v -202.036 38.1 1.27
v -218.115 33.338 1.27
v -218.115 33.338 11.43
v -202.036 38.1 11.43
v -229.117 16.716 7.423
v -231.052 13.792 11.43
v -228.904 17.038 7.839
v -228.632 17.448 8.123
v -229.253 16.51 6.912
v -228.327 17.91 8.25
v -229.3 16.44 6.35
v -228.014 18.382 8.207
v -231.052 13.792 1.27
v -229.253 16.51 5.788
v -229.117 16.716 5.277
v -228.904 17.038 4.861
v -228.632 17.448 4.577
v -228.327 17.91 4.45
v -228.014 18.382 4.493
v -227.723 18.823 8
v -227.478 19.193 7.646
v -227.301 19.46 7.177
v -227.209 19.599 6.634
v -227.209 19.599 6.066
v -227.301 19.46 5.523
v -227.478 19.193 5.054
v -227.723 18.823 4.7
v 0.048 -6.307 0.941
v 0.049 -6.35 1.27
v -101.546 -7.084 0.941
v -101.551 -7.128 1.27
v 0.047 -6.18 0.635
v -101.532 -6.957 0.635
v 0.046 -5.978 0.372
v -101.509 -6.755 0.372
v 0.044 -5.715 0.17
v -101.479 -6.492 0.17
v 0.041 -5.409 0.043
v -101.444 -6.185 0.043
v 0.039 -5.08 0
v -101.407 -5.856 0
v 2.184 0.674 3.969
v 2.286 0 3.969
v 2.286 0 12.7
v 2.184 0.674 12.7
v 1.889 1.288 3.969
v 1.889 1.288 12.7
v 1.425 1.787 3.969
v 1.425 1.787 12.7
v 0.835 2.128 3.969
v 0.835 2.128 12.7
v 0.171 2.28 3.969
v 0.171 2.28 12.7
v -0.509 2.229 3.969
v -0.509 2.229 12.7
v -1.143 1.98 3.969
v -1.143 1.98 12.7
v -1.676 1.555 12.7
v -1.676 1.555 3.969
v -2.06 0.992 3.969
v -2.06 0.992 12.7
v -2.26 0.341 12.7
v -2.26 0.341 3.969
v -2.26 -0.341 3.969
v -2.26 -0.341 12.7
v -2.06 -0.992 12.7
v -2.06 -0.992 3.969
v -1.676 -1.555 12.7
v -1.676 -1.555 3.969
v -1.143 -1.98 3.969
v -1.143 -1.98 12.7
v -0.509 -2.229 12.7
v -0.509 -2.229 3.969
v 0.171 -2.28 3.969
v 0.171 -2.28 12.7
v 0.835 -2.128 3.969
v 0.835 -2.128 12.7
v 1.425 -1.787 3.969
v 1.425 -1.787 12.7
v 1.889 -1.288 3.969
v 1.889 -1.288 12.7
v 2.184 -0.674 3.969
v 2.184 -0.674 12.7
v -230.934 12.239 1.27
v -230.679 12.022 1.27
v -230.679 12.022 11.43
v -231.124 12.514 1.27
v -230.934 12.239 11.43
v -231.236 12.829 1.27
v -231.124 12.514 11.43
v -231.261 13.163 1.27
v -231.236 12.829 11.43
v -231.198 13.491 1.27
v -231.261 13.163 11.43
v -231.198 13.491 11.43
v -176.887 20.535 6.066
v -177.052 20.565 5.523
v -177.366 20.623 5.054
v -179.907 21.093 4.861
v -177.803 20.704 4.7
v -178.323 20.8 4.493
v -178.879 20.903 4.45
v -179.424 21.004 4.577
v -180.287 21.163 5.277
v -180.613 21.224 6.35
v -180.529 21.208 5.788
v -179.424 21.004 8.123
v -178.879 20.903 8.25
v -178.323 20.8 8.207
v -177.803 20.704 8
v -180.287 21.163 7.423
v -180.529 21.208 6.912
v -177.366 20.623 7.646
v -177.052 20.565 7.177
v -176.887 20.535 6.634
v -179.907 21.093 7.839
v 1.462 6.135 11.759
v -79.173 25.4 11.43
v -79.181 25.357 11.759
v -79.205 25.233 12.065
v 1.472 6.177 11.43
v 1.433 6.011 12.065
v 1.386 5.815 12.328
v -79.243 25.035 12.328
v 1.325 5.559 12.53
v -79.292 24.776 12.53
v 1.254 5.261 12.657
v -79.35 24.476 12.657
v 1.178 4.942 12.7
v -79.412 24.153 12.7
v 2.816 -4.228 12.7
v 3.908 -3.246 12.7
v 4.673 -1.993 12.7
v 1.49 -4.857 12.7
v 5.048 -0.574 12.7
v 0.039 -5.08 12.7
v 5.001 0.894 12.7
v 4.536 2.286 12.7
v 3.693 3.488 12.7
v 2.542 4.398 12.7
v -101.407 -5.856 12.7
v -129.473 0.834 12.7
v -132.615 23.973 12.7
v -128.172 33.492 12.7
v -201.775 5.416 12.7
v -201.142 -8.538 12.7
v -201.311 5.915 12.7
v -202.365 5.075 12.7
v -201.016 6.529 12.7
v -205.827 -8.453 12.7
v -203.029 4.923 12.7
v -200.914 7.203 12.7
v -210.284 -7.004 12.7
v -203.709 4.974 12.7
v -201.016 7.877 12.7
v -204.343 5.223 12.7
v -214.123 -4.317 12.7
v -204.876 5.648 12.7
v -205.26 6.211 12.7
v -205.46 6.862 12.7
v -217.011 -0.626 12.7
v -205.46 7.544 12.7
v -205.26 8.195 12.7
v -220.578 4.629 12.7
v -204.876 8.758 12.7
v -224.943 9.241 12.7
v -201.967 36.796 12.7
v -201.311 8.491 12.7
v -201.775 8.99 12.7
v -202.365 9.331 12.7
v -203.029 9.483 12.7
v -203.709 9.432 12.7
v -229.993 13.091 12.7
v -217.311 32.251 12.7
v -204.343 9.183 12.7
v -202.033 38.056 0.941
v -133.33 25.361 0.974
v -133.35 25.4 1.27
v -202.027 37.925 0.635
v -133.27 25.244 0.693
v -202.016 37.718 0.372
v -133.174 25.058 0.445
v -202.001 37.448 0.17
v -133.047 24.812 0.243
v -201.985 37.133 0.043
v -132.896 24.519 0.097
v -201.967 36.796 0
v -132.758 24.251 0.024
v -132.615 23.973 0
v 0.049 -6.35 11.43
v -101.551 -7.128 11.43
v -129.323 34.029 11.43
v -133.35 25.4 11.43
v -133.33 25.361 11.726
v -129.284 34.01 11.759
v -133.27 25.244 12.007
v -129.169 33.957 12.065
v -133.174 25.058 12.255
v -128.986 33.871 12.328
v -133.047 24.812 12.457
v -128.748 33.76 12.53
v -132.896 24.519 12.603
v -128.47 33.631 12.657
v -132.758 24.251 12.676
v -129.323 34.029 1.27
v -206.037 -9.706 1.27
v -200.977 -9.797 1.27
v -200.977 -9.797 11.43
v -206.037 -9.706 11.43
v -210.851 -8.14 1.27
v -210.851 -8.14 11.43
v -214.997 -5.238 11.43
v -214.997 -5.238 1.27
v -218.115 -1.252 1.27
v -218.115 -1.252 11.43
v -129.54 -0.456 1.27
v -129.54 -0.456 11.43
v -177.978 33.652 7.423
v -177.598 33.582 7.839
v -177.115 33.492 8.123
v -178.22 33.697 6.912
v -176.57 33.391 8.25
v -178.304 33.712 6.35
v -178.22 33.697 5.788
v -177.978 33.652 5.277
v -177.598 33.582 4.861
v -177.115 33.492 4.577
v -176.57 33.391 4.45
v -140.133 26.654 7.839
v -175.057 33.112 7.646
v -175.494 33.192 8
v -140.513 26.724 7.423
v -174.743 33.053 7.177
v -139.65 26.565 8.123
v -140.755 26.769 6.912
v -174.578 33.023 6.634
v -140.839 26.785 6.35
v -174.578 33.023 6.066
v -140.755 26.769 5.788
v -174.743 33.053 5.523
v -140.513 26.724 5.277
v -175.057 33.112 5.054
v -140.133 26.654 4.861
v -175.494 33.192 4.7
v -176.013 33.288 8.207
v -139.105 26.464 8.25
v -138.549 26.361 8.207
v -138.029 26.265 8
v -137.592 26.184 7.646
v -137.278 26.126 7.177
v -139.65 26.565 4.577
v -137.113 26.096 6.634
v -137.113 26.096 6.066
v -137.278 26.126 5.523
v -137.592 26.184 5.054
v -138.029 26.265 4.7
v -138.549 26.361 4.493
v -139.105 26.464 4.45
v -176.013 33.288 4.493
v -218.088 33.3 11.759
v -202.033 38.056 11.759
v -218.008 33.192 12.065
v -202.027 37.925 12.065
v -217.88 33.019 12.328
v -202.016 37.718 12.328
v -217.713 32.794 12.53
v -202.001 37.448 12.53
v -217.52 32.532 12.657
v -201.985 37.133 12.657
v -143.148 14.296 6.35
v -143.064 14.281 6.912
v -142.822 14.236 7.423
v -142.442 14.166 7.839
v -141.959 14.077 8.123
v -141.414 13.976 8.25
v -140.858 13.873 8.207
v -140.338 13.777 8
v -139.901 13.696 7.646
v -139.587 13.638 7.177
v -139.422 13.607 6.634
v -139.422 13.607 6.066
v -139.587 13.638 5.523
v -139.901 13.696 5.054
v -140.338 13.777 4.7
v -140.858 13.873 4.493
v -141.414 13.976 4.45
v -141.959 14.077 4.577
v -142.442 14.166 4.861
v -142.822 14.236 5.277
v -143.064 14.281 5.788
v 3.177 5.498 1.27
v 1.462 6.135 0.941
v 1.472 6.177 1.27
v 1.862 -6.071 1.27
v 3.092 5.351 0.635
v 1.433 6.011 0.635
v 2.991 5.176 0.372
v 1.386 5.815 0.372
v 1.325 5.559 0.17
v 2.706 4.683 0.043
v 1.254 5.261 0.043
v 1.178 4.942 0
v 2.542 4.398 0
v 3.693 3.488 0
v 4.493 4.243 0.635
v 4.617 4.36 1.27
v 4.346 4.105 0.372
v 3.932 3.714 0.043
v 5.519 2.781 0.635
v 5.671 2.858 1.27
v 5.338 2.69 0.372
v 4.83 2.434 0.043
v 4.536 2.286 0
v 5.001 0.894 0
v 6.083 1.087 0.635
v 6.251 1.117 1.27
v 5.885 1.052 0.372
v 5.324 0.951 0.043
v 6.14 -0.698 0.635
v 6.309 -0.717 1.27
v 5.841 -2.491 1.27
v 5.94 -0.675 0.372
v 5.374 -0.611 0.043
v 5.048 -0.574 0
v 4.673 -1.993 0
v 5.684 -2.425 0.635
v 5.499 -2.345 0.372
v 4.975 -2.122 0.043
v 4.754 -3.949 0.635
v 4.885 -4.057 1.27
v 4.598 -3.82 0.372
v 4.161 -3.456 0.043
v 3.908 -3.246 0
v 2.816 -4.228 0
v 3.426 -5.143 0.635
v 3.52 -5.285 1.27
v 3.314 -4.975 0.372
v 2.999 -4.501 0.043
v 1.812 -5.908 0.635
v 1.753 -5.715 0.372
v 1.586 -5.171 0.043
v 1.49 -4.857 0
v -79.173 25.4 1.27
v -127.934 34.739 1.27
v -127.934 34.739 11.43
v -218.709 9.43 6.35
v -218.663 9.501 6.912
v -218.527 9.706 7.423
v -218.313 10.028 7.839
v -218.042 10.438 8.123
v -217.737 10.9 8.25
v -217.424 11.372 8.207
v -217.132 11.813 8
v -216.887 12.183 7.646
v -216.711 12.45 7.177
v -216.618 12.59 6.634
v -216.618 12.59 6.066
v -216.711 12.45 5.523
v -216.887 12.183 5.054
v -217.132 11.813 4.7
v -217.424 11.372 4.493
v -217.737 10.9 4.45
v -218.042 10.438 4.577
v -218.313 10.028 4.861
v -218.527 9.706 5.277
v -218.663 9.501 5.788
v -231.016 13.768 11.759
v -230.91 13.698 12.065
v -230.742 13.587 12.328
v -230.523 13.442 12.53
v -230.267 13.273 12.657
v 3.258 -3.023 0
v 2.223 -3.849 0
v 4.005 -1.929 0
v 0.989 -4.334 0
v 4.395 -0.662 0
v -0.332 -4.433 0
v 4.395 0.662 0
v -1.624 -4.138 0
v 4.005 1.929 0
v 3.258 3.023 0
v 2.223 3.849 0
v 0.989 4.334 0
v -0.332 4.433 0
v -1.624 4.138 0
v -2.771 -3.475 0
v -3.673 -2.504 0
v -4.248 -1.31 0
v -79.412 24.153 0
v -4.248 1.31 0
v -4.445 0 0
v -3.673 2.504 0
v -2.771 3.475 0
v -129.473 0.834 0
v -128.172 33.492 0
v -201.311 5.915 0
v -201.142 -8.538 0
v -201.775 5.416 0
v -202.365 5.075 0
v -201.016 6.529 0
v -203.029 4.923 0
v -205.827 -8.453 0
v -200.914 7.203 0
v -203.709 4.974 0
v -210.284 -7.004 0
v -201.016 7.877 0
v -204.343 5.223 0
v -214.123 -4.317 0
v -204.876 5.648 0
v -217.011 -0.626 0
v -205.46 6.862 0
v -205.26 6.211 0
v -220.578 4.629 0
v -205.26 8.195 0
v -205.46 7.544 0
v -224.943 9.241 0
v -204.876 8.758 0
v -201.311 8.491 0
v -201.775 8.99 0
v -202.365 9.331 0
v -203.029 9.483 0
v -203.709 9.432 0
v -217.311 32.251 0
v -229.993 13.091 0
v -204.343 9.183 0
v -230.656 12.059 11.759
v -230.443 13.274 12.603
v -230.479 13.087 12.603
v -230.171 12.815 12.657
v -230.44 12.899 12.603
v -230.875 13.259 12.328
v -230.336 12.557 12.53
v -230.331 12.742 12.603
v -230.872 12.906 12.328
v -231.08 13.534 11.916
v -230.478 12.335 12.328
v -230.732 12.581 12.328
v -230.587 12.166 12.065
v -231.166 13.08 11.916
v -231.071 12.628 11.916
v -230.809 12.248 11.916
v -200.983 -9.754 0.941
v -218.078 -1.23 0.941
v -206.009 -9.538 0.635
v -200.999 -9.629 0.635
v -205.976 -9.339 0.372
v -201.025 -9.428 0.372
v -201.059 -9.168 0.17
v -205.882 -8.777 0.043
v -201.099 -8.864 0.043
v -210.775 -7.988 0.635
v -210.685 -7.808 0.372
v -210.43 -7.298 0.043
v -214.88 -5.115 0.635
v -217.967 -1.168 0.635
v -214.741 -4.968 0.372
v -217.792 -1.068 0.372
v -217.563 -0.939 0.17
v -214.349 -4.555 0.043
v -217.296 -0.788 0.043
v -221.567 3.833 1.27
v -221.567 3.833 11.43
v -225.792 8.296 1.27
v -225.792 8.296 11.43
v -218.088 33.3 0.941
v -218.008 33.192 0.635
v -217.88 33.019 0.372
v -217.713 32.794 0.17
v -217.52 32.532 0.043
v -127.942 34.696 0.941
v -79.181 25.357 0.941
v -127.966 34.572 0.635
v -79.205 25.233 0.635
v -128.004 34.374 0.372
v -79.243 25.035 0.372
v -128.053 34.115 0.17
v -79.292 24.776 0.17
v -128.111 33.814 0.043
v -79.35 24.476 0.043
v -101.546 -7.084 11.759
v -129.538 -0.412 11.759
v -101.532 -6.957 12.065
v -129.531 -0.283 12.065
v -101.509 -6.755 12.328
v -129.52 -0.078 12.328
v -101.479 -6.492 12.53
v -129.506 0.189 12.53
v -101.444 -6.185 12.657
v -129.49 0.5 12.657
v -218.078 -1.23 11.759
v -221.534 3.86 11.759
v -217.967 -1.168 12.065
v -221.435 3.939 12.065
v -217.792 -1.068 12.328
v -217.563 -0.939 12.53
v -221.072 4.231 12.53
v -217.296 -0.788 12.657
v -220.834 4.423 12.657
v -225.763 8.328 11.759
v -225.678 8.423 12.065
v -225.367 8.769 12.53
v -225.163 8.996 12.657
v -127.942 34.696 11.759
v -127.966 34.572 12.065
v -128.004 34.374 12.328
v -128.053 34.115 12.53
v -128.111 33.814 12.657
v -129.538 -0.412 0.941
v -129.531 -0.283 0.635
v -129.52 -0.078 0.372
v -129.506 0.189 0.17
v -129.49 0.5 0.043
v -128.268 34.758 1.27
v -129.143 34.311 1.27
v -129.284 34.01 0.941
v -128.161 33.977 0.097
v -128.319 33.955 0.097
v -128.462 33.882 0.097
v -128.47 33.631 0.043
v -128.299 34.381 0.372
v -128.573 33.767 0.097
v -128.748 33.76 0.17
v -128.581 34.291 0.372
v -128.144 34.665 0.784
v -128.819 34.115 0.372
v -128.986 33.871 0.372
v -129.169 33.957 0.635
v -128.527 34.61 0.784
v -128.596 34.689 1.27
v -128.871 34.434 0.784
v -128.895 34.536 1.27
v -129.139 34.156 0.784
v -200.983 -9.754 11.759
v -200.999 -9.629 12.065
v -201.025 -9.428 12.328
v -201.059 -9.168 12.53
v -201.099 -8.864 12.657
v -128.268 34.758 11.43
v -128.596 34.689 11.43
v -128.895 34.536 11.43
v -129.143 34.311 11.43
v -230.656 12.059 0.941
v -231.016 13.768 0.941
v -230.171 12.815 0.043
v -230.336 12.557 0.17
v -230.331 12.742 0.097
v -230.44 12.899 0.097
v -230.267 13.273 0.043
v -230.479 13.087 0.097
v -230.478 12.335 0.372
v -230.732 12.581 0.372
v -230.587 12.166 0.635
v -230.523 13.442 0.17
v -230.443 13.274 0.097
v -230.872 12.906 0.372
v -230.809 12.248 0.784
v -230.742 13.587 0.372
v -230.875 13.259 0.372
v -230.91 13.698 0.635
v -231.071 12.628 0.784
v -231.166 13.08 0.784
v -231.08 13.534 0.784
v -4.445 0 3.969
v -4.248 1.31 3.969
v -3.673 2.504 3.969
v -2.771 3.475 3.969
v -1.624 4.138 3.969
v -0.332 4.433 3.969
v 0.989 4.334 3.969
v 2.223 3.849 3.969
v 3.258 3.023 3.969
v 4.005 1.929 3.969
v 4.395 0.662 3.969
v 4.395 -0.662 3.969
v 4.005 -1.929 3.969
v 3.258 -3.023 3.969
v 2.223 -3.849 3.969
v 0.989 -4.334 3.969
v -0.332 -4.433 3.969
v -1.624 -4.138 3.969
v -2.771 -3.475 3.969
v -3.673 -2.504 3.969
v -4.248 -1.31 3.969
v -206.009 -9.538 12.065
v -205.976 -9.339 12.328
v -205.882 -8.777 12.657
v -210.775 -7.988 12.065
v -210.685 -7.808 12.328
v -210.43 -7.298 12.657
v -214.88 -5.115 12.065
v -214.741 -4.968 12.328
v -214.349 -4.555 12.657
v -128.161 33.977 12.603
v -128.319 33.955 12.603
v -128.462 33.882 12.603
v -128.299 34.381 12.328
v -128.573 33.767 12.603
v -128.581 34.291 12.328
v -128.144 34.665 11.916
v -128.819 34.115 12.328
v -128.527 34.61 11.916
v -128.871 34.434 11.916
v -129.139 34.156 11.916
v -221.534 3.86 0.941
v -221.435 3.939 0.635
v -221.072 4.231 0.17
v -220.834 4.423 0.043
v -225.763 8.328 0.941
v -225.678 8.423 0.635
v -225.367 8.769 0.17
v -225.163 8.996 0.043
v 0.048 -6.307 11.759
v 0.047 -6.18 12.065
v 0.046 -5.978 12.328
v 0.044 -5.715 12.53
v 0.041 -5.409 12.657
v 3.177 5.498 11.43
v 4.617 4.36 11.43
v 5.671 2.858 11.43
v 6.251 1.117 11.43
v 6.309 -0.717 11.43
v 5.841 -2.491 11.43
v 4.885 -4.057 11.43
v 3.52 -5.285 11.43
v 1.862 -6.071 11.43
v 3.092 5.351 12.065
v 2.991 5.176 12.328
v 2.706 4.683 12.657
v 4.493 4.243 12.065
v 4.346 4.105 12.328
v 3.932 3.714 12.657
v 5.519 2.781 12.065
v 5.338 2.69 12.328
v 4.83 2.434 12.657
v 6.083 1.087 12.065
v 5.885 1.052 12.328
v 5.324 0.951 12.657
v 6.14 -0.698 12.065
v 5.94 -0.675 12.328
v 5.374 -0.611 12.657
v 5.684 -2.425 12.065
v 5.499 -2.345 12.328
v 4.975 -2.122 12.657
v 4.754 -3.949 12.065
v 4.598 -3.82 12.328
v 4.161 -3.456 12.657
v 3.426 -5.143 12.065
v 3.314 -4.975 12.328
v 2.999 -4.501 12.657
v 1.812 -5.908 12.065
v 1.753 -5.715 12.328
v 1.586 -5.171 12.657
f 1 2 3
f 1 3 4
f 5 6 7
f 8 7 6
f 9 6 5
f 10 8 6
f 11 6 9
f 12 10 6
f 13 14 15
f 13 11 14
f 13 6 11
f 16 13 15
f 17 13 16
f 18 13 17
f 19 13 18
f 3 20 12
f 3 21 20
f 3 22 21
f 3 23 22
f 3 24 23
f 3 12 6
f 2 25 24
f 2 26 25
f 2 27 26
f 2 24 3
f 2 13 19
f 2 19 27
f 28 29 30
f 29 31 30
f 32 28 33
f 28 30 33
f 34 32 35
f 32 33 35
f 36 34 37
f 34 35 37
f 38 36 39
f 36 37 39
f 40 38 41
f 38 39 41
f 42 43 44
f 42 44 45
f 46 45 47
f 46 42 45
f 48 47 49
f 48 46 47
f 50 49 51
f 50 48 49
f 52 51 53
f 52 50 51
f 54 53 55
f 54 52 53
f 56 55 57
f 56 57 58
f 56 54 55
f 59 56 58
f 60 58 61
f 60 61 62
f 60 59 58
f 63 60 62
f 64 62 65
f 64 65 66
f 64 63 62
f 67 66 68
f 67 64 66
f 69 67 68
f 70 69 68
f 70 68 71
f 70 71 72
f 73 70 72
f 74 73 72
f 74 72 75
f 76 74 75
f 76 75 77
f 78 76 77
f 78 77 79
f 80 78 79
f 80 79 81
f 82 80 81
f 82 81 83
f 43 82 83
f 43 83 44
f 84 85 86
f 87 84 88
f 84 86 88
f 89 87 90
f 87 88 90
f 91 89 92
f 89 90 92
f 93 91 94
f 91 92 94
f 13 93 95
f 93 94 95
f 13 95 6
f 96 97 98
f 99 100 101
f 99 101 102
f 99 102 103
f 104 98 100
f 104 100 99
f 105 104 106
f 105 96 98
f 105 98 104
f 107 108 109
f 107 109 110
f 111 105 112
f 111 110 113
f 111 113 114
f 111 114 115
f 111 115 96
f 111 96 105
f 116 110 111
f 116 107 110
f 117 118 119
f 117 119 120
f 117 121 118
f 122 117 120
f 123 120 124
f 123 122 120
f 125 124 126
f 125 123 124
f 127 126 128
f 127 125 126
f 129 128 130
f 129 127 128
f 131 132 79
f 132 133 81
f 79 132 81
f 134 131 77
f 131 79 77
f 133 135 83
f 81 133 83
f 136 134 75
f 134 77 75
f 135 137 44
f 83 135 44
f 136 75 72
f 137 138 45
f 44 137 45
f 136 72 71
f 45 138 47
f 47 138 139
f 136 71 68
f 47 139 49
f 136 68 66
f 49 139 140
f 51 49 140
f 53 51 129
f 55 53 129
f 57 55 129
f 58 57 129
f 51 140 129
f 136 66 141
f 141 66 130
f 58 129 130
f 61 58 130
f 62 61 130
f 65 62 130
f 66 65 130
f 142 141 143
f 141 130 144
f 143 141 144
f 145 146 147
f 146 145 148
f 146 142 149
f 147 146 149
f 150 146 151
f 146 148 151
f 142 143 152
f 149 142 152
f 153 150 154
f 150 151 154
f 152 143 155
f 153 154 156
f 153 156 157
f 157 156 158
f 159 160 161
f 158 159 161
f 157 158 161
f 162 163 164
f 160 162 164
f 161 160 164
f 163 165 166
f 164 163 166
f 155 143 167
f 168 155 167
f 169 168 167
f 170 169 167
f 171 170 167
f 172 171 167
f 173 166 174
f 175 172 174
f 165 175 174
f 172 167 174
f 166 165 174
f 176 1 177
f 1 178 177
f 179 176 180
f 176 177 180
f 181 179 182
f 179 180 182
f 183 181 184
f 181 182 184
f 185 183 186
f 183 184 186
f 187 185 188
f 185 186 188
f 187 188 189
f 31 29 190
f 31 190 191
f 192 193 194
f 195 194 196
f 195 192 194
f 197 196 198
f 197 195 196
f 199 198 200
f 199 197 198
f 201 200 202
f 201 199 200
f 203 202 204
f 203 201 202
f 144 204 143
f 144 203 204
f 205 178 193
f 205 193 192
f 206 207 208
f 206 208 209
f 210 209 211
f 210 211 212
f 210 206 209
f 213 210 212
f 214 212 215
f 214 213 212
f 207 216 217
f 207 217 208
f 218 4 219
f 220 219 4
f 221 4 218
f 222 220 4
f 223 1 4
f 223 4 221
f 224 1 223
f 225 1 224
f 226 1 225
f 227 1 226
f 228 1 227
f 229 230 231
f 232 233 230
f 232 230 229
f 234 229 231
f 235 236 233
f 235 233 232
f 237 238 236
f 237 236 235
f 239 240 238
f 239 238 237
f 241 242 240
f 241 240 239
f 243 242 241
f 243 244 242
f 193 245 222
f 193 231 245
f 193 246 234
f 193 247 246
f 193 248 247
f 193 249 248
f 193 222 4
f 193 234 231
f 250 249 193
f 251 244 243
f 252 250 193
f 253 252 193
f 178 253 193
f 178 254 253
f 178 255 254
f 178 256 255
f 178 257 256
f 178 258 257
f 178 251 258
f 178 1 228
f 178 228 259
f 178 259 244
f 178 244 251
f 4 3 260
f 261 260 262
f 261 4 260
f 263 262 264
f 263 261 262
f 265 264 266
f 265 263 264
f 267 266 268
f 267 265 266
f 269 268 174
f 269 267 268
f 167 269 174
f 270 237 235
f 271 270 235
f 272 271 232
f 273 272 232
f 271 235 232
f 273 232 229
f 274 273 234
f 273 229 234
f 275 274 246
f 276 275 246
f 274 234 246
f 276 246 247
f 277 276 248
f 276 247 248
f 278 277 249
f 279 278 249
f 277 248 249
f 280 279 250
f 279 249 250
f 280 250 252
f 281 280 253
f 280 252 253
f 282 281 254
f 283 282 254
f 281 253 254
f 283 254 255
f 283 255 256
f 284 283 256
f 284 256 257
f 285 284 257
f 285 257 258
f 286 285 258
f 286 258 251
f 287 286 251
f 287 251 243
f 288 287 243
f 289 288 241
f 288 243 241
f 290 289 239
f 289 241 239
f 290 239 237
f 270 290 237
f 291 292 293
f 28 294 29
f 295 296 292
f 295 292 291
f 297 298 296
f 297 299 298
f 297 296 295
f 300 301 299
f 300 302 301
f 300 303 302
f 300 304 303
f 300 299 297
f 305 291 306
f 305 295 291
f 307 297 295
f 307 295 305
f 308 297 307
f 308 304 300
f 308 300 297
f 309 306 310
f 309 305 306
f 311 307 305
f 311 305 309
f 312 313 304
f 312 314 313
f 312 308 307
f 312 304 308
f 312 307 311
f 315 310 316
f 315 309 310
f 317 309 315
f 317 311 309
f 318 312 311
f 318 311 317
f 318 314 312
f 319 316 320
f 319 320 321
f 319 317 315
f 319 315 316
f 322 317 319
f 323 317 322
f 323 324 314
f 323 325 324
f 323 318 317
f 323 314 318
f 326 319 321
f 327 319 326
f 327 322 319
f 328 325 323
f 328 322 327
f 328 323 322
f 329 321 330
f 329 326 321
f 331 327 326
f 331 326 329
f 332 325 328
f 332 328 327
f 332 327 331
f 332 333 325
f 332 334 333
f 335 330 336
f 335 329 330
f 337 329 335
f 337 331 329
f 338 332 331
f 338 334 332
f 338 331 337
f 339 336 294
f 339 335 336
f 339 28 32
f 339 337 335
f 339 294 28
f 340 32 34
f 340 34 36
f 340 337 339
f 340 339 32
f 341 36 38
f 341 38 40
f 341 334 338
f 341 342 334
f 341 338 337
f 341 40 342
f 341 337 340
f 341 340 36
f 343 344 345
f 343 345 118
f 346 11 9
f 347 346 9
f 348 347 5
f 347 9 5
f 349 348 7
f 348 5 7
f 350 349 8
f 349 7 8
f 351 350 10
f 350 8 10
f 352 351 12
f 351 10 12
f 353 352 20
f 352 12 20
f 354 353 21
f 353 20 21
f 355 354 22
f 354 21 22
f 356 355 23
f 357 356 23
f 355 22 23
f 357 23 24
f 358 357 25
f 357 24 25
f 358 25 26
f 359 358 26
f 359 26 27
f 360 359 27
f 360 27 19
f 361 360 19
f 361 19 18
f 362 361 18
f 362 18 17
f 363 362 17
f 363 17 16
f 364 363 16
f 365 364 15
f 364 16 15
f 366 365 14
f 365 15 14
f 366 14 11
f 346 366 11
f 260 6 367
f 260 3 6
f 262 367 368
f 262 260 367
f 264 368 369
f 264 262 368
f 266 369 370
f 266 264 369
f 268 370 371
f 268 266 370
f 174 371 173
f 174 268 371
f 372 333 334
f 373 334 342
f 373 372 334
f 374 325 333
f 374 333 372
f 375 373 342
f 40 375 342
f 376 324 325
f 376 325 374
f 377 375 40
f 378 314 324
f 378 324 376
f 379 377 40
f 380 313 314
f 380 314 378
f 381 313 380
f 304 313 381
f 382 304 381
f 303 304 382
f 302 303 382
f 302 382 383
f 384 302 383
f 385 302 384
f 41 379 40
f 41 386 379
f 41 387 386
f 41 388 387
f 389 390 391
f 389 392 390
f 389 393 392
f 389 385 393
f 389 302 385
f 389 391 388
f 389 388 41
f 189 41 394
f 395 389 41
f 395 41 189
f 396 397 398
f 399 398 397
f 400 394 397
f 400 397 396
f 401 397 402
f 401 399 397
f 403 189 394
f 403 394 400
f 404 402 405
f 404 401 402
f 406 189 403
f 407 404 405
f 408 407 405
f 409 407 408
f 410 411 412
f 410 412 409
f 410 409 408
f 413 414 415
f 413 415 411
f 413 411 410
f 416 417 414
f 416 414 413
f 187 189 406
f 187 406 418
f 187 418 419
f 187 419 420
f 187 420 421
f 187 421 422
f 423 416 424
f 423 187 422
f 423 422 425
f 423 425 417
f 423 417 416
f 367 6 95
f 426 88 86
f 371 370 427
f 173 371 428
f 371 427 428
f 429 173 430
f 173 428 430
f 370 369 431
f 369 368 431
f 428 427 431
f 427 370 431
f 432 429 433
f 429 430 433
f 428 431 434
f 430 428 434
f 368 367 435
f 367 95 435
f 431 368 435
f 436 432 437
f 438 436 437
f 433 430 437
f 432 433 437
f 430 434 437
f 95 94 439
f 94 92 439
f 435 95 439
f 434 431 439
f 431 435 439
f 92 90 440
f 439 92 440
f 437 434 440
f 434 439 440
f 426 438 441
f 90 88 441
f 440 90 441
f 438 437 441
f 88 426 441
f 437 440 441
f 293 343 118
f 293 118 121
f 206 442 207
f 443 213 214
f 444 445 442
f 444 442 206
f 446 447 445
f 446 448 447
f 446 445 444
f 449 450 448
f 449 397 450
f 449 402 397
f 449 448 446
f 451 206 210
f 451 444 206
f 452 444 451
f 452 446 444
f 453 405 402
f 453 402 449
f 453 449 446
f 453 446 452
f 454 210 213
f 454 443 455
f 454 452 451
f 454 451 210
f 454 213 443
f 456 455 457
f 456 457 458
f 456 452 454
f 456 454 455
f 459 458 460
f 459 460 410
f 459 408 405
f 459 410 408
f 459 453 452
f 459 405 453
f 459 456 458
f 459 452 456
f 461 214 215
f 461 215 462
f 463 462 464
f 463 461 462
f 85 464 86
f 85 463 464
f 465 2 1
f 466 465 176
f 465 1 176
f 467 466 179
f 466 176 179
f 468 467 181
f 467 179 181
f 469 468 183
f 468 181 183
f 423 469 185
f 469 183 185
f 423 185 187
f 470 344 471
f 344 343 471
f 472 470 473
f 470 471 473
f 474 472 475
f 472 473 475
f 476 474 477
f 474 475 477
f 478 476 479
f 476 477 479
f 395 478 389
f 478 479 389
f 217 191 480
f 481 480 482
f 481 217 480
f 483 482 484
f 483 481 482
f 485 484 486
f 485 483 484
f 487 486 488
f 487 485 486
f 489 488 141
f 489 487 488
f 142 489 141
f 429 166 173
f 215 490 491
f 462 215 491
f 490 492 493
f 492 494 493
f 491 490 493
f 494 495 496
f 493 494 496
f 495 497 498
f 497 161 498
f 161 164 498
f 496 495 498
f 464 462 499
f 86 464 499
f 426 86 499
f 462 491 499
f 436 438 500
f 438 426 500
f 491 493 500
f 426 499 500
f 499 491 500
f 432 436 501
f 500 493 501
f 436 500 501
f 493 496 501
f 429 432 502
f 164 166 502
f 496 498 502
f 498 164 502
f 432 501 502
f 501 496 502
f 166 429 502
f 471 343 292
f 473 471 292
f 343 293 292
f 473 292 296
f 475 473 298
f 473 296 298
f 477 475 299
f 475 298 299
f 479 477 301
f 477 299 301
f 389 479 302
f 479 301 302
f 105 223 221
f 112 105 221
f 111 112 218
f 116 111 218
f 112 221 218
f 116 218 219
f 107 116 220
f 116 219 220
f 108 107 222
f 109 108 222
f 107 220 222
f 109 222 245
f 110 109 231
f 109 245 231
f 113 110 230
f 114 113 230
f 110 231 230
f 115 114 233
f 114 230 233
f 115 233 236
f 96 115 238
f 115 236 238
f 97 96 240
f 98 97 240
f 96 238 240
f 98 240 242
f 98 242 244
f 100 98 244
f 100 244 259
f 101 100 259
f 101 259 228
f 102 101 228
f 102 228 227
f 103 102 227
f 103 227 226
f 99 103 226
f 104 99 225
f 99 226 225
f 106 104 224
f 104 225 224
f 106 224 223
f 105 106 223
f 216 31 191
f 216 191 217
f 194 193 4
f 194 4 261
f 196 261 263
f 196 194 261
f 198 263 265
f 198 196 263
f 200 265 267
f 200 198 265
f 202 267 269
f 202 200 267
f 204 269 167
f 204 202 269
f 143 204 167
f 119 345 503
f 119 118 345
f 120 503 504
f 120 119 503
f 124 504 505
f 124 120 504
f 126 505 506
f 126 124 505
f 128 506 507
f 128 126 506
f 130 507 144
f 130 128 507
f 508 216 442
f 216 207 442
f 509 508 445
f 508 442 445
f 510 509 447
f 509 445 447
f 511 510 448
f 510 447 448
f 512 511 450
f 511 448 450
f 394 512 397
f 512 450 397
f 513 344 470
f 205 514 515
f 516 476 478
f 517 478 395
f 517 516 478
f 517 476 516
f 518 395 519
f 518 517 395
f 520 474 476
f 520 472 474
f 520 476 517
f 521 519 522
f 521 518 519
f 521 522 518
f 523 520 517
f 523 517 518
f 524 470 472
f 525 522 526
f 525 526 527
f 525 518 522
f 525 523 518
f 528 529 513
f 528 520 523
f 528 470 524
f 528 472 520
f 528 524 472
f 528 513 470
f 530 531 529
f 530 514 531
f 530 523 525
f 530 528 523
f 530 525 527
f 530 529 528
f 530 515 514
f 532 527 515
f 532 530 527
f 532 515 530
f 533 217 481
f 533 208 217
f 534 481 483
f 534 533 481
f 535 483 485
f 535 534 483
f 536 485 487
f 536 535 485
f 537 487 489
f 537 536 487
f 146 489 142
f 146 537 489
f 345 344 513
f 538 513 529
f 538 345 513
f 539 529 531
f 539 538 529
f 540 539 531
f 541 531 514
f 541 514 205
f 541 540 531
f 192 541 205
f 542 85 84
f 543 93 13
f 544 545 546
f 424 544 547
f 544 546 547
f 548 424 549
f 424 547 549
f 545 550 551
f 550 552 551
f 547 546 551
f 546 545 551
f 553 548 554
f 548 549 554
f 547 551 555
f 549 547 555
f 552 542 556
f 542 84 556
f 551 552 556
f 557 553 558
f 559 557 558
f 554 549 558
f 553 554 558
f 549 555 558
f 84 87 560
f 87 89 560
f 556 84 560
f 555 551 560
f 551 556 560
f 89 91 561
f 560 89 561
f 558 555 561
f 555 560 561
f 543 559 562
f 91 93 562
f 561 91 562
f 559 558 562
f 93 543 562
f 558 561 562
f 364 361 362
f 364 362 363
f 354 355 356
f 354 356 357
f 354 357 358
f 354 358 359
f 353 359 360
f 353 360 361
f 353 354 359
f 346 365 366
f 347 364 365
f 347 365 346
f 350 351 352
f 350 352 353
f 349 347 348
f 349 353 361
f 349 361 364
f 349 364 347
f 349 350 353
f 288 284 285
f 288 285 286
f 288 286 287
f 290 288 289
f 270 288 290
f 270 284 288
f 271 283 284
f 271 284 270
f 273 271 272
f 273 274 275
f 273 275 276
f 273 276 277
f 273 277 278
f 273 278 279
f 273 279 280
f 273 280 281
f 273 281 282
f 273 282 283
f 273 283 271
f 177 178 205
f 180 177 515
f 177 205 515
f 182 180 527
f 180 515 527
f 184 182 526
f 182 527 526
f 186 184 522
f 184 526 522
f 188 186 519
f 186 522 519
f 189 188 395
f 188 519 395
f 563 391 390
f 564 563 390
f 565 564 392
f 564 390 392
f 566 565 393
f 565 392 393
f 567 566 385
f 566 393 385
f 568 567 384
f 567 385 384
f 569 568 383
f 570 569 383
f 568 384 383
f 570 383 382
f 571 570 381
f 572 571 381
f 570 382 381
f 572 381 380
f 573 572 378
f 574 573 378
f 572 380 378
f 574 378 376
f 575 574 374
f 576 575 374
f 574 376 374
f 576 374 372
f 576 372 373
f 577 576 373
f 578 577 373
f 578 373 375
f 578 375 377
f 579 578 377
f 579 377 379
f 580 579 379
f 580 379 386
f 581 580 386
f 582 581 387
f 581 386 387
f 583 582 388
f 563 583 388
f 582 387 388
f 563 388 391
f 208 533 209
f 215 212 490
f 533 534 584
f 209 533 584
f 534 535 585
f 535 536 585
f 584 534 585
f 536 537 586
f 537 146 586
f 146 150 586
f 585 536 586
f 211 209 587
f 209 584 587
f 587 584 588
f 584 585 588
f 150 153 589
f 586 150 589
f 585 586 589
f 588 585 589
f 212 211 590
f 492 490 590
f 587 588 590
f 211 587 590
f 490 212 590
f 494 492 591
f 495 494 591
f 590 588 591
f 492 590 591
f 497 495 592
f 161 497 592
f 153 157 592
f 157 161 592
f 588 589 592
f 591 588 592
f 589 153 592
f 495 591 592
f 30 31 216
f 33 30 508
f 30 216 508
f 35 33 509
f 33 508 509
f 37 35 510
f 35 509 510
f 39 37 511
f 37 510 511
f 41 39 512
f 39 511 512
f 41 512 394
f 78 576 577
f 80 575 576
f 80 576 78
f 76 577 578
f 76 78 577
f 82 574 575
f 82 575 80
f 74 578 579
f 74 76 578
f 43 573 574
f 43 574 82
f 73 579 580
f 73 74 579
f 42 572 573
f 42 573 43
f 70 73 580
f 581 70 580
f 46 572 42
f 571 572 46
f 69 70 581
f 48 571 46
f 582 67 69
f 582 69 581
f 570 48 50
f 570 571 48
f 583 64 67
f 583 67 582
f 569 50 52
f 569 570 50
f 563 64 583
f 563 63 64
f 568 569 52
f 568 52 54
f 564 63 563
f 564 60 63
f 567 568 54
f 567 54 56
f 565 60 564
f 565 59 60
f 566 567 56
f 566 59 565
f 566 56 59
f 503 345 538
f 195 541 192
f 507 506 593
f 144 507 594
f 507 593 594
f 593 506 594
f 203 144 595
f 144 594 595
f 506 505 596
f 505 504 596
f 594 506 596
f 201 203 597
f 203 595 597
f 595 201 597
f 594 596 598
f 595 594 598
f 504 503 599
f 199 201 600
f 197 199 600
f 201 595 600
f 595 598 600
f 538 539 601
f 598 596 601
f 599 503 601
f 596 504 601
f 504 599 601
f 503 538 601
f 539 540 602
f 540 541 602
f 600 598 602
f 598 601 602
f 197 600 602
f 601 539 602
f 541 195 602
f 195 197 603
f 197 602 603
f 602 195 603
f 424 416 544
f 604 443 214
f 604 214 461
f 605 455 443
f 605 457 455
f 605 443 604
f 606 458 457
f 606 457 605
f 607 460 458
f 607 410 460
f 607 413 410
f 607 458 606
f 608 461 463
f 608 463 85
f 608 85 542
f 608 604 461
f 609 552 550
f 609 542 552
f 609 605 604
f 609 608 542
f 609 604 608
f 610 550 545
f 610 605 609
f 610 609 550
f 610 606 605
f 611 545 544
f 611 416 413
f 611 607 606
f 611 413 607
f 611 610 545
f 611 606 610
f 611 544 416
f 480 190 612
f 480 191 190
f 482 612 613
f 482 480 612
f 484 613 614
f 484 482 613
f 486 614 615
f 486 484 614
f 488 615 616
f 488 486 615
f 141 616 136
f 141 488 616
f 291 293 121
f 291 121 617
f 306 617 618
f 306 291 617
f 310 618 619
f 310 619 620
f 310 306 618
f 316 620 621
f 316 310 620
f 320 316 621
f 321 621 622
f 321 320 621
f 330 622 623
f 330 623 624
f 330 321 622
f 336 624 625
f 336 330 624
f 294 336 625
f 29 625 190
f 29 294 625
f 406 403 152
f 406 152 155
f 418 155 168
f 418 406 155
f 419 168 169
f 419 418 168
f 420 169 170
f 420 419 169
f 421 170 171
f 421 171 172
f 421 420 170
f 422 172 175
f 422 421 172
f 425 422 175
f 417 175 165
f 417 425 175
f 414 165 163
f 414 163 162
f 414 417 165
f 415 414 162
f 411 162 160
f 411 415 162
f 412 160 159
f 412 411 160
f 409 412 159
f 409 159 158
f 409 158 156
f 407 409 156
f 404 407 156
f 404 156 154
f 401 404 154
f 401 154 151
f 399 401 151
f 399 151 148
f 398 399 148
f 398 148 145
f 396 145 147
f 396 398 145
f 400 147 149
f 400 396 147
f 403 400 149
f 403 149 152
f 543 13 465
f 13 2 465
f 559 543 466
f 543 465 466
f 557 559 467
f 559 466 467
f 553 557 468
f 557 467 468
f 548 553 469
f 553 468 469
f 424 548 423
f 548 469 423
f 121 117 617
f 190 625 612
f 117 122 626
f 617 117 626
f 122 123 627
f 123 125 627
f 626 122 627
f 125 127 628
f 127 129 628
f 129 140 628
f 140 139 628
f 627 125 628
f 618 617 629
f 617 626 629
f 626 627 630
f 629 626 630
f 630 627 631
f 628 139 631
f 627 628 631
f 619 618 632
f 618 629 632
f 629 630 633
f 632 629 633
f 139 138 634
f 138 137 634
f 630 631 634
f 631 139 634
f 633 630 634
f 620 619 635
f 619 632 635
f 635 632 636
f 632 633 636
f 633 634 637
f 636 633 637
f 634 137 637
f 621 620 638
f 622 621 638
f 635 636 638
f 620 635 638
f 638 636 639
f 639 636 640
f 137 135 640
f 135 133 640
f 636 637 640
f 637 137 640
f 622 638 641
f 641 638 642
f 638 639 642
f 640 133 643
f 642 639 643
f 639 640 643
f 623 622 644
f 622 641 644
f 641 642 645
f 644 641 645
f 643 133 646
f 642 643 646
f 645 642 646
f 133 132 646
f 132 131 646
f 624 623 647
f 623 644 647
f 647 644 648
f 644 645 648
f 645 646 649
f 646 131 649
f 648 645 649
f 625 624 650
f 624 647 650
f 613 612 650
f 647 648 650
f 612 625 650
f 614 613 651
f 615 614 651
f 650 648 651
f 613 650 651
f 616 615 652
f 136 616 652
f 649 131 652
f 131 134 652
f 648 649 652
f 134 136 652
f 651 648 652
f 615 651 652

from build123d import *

# Parameters (mm, degrees)
SKETCH1_R           = 2.286
BOSS_EXTRUDE1_DEPTH = 12.7
FILLET1_R           = 1.27
SKETCH2_R           = 4.445
CUT_EXTRUDE1_DEPTH  = 3.96875
SKETCH3_R           = 1.905
CUT_EXTRUDE2_DEPTH  = 12.7
SKETCH4_R           = 1.905
CUT_EXTRUDE3_DEPTH  = 12.7


with BuildPart() as part:
    # Sketch1 → Boss-Extrude1 (new body)
    with BuildSketch(Plane.XY):
        with BuildLine():
            Line((0.048604687, -6.34981398), (-101.551395313, -7.127511762))
            Line((-101.551395313, -7.127511762), (-129.54, -0.455968887))
            Line((-129.54, -0.455968887), (-200.976985186, -9.797318323))
            ThreePointArc((-200.976985186, -9.797318323), (-210.850504728, -8.14047549), (-218.115352674, -1.251825358))
            ThreePointArc((-218.115352674, -1.251825358), (-224.036255837, 6.613973279), (-231.775, 12.7))
            Line((-231.775, 12.7), (-218.115352674, 33.3375))
            Line((-218.115352674, 33.3375), (-202.035751798, 38.1))
            Line((-202.035751798, 38.1), (-133.35, 25.4))
            Line((-133.35, 25.4), (-128.905, 34.925))
            Line((-128.905, 34.925), (-79.17262462, 25.4))
            Line((-79.17262462, 25.4), (1.47237538, 6.17694186))
            ThreePointArc((1.47237538, 6.17694186), (6.309377787, -0.717113616), (0.048604687, -6.34981398))
        make_face()
        Circle(SKETCH1_R, mode=Mode.SUBTRACT)
        with Locations((-203.2, 7.20295315)):
            Circle(SKETCH1_R, mode=Mode.SUBTRACT)
    extrude(amount=BOSS_EXTRUDE1_DEPTH)

    # Fillet1
    fillet1_edges = [part.edges().sort_by_distance(p)[0] for p in [
        (-50.751395313, -6.738662871, 0),
        (-115.545697656, -3.791740325, 0),
        (-104.03881231, 30.1625, 12.7),
        (-165.258492593, -5.126643605, 0),
        (-210.850504728, -8.14047549, 0),
        (-224.036255837, 6.613973279, 0),
        (-224.945176337, 23.01875, 0),
        (-210.075552236, 35.71875, 0),
        (-167.692875899, 31.75, 0),
        (-131.1275, 30.1625, 0),
        (-104.03881231, 30.1625, 0),
        (-38.85012462, 15.78847093, 0),
        (6.309377787, -0.717113616, 0),
        (-131.1275, 30.1625, 12.7),
        (-167.692875899, 31.75, 12.7),
        (-231.775, 12.7, 6.35),
        (-128.905, 34.925, 6.35),
        (-210.075552236, 35.71875, 12.7),
        (-224.945176337, 23.01875, 12.7),
        (-224.036255837, 6.613973279, 12.7),
        (-210.850504728, -8.14047549, 12.7),
        (-165.258492593, -5.126643605, 12.7),
        (-115.545697656, -3.791740325, 12.7),
        (-50.751395313, -6.738662871, 12.7),
        (6.309377787, -0.717113616, 12.7),
        (-38.85012462, 15.78847093, 12.7),
    ]]
    fillet(fillet1_edges, radius=FILLET1_R)

    # Sketch2 → Cut-Extrude1 (cut)
    with BuildSketch(Plane(origin=(0, 0, 0), x_dir=(-1, 0, 0), z_dir=(0, 0, -1))):
        Circle(SKETCH2_R)
    extrude(amount=-CUT_EXTRUDE1_DEPTH, mode=Mode.SUBTRACT)

    # Sketch3 → Cut-Extrude2 (cut)
    with BuildSketch(Plane(origin=(0.132942268, 0.718995244, 0), x_dir=(0.9833321660356336, -0.18181818181818188, 0), z_dir=(0.18181818181818188, 0.9833321660356336, 0))):
        with Locations(Location((-179.556061292, -6.35, 0), (0, 0, 180))):
            Circle(SKETCH3_R)
        with Locations(Location((-141.456061292, -6.35, 0), (0, 0, 180))):
            Circle(SKETCH3_R)
    extrude(amount=-CUT_EXTRUDE2_DEPTH, mode=Mode.SUBTRACT)

    # Sketch4 → Cut-Extrude3 (cut)
    with BuildSketch(Plane(origin=(-167.013671414, 110.543808611, 0), x_dir=(0, 0, 1), z_dir=(-0.8338861185572083, 0.5519365373642097, 0))):
        with Locations(Location((6.35, -110.945024644, 0), (0, 0, 270))):
            Circle(SKETCH4_R)
    extrude(amount=-CUT_EXTRUDE3_DEPTH, mode=Mode.SUBTRACT)


solid = part.part
